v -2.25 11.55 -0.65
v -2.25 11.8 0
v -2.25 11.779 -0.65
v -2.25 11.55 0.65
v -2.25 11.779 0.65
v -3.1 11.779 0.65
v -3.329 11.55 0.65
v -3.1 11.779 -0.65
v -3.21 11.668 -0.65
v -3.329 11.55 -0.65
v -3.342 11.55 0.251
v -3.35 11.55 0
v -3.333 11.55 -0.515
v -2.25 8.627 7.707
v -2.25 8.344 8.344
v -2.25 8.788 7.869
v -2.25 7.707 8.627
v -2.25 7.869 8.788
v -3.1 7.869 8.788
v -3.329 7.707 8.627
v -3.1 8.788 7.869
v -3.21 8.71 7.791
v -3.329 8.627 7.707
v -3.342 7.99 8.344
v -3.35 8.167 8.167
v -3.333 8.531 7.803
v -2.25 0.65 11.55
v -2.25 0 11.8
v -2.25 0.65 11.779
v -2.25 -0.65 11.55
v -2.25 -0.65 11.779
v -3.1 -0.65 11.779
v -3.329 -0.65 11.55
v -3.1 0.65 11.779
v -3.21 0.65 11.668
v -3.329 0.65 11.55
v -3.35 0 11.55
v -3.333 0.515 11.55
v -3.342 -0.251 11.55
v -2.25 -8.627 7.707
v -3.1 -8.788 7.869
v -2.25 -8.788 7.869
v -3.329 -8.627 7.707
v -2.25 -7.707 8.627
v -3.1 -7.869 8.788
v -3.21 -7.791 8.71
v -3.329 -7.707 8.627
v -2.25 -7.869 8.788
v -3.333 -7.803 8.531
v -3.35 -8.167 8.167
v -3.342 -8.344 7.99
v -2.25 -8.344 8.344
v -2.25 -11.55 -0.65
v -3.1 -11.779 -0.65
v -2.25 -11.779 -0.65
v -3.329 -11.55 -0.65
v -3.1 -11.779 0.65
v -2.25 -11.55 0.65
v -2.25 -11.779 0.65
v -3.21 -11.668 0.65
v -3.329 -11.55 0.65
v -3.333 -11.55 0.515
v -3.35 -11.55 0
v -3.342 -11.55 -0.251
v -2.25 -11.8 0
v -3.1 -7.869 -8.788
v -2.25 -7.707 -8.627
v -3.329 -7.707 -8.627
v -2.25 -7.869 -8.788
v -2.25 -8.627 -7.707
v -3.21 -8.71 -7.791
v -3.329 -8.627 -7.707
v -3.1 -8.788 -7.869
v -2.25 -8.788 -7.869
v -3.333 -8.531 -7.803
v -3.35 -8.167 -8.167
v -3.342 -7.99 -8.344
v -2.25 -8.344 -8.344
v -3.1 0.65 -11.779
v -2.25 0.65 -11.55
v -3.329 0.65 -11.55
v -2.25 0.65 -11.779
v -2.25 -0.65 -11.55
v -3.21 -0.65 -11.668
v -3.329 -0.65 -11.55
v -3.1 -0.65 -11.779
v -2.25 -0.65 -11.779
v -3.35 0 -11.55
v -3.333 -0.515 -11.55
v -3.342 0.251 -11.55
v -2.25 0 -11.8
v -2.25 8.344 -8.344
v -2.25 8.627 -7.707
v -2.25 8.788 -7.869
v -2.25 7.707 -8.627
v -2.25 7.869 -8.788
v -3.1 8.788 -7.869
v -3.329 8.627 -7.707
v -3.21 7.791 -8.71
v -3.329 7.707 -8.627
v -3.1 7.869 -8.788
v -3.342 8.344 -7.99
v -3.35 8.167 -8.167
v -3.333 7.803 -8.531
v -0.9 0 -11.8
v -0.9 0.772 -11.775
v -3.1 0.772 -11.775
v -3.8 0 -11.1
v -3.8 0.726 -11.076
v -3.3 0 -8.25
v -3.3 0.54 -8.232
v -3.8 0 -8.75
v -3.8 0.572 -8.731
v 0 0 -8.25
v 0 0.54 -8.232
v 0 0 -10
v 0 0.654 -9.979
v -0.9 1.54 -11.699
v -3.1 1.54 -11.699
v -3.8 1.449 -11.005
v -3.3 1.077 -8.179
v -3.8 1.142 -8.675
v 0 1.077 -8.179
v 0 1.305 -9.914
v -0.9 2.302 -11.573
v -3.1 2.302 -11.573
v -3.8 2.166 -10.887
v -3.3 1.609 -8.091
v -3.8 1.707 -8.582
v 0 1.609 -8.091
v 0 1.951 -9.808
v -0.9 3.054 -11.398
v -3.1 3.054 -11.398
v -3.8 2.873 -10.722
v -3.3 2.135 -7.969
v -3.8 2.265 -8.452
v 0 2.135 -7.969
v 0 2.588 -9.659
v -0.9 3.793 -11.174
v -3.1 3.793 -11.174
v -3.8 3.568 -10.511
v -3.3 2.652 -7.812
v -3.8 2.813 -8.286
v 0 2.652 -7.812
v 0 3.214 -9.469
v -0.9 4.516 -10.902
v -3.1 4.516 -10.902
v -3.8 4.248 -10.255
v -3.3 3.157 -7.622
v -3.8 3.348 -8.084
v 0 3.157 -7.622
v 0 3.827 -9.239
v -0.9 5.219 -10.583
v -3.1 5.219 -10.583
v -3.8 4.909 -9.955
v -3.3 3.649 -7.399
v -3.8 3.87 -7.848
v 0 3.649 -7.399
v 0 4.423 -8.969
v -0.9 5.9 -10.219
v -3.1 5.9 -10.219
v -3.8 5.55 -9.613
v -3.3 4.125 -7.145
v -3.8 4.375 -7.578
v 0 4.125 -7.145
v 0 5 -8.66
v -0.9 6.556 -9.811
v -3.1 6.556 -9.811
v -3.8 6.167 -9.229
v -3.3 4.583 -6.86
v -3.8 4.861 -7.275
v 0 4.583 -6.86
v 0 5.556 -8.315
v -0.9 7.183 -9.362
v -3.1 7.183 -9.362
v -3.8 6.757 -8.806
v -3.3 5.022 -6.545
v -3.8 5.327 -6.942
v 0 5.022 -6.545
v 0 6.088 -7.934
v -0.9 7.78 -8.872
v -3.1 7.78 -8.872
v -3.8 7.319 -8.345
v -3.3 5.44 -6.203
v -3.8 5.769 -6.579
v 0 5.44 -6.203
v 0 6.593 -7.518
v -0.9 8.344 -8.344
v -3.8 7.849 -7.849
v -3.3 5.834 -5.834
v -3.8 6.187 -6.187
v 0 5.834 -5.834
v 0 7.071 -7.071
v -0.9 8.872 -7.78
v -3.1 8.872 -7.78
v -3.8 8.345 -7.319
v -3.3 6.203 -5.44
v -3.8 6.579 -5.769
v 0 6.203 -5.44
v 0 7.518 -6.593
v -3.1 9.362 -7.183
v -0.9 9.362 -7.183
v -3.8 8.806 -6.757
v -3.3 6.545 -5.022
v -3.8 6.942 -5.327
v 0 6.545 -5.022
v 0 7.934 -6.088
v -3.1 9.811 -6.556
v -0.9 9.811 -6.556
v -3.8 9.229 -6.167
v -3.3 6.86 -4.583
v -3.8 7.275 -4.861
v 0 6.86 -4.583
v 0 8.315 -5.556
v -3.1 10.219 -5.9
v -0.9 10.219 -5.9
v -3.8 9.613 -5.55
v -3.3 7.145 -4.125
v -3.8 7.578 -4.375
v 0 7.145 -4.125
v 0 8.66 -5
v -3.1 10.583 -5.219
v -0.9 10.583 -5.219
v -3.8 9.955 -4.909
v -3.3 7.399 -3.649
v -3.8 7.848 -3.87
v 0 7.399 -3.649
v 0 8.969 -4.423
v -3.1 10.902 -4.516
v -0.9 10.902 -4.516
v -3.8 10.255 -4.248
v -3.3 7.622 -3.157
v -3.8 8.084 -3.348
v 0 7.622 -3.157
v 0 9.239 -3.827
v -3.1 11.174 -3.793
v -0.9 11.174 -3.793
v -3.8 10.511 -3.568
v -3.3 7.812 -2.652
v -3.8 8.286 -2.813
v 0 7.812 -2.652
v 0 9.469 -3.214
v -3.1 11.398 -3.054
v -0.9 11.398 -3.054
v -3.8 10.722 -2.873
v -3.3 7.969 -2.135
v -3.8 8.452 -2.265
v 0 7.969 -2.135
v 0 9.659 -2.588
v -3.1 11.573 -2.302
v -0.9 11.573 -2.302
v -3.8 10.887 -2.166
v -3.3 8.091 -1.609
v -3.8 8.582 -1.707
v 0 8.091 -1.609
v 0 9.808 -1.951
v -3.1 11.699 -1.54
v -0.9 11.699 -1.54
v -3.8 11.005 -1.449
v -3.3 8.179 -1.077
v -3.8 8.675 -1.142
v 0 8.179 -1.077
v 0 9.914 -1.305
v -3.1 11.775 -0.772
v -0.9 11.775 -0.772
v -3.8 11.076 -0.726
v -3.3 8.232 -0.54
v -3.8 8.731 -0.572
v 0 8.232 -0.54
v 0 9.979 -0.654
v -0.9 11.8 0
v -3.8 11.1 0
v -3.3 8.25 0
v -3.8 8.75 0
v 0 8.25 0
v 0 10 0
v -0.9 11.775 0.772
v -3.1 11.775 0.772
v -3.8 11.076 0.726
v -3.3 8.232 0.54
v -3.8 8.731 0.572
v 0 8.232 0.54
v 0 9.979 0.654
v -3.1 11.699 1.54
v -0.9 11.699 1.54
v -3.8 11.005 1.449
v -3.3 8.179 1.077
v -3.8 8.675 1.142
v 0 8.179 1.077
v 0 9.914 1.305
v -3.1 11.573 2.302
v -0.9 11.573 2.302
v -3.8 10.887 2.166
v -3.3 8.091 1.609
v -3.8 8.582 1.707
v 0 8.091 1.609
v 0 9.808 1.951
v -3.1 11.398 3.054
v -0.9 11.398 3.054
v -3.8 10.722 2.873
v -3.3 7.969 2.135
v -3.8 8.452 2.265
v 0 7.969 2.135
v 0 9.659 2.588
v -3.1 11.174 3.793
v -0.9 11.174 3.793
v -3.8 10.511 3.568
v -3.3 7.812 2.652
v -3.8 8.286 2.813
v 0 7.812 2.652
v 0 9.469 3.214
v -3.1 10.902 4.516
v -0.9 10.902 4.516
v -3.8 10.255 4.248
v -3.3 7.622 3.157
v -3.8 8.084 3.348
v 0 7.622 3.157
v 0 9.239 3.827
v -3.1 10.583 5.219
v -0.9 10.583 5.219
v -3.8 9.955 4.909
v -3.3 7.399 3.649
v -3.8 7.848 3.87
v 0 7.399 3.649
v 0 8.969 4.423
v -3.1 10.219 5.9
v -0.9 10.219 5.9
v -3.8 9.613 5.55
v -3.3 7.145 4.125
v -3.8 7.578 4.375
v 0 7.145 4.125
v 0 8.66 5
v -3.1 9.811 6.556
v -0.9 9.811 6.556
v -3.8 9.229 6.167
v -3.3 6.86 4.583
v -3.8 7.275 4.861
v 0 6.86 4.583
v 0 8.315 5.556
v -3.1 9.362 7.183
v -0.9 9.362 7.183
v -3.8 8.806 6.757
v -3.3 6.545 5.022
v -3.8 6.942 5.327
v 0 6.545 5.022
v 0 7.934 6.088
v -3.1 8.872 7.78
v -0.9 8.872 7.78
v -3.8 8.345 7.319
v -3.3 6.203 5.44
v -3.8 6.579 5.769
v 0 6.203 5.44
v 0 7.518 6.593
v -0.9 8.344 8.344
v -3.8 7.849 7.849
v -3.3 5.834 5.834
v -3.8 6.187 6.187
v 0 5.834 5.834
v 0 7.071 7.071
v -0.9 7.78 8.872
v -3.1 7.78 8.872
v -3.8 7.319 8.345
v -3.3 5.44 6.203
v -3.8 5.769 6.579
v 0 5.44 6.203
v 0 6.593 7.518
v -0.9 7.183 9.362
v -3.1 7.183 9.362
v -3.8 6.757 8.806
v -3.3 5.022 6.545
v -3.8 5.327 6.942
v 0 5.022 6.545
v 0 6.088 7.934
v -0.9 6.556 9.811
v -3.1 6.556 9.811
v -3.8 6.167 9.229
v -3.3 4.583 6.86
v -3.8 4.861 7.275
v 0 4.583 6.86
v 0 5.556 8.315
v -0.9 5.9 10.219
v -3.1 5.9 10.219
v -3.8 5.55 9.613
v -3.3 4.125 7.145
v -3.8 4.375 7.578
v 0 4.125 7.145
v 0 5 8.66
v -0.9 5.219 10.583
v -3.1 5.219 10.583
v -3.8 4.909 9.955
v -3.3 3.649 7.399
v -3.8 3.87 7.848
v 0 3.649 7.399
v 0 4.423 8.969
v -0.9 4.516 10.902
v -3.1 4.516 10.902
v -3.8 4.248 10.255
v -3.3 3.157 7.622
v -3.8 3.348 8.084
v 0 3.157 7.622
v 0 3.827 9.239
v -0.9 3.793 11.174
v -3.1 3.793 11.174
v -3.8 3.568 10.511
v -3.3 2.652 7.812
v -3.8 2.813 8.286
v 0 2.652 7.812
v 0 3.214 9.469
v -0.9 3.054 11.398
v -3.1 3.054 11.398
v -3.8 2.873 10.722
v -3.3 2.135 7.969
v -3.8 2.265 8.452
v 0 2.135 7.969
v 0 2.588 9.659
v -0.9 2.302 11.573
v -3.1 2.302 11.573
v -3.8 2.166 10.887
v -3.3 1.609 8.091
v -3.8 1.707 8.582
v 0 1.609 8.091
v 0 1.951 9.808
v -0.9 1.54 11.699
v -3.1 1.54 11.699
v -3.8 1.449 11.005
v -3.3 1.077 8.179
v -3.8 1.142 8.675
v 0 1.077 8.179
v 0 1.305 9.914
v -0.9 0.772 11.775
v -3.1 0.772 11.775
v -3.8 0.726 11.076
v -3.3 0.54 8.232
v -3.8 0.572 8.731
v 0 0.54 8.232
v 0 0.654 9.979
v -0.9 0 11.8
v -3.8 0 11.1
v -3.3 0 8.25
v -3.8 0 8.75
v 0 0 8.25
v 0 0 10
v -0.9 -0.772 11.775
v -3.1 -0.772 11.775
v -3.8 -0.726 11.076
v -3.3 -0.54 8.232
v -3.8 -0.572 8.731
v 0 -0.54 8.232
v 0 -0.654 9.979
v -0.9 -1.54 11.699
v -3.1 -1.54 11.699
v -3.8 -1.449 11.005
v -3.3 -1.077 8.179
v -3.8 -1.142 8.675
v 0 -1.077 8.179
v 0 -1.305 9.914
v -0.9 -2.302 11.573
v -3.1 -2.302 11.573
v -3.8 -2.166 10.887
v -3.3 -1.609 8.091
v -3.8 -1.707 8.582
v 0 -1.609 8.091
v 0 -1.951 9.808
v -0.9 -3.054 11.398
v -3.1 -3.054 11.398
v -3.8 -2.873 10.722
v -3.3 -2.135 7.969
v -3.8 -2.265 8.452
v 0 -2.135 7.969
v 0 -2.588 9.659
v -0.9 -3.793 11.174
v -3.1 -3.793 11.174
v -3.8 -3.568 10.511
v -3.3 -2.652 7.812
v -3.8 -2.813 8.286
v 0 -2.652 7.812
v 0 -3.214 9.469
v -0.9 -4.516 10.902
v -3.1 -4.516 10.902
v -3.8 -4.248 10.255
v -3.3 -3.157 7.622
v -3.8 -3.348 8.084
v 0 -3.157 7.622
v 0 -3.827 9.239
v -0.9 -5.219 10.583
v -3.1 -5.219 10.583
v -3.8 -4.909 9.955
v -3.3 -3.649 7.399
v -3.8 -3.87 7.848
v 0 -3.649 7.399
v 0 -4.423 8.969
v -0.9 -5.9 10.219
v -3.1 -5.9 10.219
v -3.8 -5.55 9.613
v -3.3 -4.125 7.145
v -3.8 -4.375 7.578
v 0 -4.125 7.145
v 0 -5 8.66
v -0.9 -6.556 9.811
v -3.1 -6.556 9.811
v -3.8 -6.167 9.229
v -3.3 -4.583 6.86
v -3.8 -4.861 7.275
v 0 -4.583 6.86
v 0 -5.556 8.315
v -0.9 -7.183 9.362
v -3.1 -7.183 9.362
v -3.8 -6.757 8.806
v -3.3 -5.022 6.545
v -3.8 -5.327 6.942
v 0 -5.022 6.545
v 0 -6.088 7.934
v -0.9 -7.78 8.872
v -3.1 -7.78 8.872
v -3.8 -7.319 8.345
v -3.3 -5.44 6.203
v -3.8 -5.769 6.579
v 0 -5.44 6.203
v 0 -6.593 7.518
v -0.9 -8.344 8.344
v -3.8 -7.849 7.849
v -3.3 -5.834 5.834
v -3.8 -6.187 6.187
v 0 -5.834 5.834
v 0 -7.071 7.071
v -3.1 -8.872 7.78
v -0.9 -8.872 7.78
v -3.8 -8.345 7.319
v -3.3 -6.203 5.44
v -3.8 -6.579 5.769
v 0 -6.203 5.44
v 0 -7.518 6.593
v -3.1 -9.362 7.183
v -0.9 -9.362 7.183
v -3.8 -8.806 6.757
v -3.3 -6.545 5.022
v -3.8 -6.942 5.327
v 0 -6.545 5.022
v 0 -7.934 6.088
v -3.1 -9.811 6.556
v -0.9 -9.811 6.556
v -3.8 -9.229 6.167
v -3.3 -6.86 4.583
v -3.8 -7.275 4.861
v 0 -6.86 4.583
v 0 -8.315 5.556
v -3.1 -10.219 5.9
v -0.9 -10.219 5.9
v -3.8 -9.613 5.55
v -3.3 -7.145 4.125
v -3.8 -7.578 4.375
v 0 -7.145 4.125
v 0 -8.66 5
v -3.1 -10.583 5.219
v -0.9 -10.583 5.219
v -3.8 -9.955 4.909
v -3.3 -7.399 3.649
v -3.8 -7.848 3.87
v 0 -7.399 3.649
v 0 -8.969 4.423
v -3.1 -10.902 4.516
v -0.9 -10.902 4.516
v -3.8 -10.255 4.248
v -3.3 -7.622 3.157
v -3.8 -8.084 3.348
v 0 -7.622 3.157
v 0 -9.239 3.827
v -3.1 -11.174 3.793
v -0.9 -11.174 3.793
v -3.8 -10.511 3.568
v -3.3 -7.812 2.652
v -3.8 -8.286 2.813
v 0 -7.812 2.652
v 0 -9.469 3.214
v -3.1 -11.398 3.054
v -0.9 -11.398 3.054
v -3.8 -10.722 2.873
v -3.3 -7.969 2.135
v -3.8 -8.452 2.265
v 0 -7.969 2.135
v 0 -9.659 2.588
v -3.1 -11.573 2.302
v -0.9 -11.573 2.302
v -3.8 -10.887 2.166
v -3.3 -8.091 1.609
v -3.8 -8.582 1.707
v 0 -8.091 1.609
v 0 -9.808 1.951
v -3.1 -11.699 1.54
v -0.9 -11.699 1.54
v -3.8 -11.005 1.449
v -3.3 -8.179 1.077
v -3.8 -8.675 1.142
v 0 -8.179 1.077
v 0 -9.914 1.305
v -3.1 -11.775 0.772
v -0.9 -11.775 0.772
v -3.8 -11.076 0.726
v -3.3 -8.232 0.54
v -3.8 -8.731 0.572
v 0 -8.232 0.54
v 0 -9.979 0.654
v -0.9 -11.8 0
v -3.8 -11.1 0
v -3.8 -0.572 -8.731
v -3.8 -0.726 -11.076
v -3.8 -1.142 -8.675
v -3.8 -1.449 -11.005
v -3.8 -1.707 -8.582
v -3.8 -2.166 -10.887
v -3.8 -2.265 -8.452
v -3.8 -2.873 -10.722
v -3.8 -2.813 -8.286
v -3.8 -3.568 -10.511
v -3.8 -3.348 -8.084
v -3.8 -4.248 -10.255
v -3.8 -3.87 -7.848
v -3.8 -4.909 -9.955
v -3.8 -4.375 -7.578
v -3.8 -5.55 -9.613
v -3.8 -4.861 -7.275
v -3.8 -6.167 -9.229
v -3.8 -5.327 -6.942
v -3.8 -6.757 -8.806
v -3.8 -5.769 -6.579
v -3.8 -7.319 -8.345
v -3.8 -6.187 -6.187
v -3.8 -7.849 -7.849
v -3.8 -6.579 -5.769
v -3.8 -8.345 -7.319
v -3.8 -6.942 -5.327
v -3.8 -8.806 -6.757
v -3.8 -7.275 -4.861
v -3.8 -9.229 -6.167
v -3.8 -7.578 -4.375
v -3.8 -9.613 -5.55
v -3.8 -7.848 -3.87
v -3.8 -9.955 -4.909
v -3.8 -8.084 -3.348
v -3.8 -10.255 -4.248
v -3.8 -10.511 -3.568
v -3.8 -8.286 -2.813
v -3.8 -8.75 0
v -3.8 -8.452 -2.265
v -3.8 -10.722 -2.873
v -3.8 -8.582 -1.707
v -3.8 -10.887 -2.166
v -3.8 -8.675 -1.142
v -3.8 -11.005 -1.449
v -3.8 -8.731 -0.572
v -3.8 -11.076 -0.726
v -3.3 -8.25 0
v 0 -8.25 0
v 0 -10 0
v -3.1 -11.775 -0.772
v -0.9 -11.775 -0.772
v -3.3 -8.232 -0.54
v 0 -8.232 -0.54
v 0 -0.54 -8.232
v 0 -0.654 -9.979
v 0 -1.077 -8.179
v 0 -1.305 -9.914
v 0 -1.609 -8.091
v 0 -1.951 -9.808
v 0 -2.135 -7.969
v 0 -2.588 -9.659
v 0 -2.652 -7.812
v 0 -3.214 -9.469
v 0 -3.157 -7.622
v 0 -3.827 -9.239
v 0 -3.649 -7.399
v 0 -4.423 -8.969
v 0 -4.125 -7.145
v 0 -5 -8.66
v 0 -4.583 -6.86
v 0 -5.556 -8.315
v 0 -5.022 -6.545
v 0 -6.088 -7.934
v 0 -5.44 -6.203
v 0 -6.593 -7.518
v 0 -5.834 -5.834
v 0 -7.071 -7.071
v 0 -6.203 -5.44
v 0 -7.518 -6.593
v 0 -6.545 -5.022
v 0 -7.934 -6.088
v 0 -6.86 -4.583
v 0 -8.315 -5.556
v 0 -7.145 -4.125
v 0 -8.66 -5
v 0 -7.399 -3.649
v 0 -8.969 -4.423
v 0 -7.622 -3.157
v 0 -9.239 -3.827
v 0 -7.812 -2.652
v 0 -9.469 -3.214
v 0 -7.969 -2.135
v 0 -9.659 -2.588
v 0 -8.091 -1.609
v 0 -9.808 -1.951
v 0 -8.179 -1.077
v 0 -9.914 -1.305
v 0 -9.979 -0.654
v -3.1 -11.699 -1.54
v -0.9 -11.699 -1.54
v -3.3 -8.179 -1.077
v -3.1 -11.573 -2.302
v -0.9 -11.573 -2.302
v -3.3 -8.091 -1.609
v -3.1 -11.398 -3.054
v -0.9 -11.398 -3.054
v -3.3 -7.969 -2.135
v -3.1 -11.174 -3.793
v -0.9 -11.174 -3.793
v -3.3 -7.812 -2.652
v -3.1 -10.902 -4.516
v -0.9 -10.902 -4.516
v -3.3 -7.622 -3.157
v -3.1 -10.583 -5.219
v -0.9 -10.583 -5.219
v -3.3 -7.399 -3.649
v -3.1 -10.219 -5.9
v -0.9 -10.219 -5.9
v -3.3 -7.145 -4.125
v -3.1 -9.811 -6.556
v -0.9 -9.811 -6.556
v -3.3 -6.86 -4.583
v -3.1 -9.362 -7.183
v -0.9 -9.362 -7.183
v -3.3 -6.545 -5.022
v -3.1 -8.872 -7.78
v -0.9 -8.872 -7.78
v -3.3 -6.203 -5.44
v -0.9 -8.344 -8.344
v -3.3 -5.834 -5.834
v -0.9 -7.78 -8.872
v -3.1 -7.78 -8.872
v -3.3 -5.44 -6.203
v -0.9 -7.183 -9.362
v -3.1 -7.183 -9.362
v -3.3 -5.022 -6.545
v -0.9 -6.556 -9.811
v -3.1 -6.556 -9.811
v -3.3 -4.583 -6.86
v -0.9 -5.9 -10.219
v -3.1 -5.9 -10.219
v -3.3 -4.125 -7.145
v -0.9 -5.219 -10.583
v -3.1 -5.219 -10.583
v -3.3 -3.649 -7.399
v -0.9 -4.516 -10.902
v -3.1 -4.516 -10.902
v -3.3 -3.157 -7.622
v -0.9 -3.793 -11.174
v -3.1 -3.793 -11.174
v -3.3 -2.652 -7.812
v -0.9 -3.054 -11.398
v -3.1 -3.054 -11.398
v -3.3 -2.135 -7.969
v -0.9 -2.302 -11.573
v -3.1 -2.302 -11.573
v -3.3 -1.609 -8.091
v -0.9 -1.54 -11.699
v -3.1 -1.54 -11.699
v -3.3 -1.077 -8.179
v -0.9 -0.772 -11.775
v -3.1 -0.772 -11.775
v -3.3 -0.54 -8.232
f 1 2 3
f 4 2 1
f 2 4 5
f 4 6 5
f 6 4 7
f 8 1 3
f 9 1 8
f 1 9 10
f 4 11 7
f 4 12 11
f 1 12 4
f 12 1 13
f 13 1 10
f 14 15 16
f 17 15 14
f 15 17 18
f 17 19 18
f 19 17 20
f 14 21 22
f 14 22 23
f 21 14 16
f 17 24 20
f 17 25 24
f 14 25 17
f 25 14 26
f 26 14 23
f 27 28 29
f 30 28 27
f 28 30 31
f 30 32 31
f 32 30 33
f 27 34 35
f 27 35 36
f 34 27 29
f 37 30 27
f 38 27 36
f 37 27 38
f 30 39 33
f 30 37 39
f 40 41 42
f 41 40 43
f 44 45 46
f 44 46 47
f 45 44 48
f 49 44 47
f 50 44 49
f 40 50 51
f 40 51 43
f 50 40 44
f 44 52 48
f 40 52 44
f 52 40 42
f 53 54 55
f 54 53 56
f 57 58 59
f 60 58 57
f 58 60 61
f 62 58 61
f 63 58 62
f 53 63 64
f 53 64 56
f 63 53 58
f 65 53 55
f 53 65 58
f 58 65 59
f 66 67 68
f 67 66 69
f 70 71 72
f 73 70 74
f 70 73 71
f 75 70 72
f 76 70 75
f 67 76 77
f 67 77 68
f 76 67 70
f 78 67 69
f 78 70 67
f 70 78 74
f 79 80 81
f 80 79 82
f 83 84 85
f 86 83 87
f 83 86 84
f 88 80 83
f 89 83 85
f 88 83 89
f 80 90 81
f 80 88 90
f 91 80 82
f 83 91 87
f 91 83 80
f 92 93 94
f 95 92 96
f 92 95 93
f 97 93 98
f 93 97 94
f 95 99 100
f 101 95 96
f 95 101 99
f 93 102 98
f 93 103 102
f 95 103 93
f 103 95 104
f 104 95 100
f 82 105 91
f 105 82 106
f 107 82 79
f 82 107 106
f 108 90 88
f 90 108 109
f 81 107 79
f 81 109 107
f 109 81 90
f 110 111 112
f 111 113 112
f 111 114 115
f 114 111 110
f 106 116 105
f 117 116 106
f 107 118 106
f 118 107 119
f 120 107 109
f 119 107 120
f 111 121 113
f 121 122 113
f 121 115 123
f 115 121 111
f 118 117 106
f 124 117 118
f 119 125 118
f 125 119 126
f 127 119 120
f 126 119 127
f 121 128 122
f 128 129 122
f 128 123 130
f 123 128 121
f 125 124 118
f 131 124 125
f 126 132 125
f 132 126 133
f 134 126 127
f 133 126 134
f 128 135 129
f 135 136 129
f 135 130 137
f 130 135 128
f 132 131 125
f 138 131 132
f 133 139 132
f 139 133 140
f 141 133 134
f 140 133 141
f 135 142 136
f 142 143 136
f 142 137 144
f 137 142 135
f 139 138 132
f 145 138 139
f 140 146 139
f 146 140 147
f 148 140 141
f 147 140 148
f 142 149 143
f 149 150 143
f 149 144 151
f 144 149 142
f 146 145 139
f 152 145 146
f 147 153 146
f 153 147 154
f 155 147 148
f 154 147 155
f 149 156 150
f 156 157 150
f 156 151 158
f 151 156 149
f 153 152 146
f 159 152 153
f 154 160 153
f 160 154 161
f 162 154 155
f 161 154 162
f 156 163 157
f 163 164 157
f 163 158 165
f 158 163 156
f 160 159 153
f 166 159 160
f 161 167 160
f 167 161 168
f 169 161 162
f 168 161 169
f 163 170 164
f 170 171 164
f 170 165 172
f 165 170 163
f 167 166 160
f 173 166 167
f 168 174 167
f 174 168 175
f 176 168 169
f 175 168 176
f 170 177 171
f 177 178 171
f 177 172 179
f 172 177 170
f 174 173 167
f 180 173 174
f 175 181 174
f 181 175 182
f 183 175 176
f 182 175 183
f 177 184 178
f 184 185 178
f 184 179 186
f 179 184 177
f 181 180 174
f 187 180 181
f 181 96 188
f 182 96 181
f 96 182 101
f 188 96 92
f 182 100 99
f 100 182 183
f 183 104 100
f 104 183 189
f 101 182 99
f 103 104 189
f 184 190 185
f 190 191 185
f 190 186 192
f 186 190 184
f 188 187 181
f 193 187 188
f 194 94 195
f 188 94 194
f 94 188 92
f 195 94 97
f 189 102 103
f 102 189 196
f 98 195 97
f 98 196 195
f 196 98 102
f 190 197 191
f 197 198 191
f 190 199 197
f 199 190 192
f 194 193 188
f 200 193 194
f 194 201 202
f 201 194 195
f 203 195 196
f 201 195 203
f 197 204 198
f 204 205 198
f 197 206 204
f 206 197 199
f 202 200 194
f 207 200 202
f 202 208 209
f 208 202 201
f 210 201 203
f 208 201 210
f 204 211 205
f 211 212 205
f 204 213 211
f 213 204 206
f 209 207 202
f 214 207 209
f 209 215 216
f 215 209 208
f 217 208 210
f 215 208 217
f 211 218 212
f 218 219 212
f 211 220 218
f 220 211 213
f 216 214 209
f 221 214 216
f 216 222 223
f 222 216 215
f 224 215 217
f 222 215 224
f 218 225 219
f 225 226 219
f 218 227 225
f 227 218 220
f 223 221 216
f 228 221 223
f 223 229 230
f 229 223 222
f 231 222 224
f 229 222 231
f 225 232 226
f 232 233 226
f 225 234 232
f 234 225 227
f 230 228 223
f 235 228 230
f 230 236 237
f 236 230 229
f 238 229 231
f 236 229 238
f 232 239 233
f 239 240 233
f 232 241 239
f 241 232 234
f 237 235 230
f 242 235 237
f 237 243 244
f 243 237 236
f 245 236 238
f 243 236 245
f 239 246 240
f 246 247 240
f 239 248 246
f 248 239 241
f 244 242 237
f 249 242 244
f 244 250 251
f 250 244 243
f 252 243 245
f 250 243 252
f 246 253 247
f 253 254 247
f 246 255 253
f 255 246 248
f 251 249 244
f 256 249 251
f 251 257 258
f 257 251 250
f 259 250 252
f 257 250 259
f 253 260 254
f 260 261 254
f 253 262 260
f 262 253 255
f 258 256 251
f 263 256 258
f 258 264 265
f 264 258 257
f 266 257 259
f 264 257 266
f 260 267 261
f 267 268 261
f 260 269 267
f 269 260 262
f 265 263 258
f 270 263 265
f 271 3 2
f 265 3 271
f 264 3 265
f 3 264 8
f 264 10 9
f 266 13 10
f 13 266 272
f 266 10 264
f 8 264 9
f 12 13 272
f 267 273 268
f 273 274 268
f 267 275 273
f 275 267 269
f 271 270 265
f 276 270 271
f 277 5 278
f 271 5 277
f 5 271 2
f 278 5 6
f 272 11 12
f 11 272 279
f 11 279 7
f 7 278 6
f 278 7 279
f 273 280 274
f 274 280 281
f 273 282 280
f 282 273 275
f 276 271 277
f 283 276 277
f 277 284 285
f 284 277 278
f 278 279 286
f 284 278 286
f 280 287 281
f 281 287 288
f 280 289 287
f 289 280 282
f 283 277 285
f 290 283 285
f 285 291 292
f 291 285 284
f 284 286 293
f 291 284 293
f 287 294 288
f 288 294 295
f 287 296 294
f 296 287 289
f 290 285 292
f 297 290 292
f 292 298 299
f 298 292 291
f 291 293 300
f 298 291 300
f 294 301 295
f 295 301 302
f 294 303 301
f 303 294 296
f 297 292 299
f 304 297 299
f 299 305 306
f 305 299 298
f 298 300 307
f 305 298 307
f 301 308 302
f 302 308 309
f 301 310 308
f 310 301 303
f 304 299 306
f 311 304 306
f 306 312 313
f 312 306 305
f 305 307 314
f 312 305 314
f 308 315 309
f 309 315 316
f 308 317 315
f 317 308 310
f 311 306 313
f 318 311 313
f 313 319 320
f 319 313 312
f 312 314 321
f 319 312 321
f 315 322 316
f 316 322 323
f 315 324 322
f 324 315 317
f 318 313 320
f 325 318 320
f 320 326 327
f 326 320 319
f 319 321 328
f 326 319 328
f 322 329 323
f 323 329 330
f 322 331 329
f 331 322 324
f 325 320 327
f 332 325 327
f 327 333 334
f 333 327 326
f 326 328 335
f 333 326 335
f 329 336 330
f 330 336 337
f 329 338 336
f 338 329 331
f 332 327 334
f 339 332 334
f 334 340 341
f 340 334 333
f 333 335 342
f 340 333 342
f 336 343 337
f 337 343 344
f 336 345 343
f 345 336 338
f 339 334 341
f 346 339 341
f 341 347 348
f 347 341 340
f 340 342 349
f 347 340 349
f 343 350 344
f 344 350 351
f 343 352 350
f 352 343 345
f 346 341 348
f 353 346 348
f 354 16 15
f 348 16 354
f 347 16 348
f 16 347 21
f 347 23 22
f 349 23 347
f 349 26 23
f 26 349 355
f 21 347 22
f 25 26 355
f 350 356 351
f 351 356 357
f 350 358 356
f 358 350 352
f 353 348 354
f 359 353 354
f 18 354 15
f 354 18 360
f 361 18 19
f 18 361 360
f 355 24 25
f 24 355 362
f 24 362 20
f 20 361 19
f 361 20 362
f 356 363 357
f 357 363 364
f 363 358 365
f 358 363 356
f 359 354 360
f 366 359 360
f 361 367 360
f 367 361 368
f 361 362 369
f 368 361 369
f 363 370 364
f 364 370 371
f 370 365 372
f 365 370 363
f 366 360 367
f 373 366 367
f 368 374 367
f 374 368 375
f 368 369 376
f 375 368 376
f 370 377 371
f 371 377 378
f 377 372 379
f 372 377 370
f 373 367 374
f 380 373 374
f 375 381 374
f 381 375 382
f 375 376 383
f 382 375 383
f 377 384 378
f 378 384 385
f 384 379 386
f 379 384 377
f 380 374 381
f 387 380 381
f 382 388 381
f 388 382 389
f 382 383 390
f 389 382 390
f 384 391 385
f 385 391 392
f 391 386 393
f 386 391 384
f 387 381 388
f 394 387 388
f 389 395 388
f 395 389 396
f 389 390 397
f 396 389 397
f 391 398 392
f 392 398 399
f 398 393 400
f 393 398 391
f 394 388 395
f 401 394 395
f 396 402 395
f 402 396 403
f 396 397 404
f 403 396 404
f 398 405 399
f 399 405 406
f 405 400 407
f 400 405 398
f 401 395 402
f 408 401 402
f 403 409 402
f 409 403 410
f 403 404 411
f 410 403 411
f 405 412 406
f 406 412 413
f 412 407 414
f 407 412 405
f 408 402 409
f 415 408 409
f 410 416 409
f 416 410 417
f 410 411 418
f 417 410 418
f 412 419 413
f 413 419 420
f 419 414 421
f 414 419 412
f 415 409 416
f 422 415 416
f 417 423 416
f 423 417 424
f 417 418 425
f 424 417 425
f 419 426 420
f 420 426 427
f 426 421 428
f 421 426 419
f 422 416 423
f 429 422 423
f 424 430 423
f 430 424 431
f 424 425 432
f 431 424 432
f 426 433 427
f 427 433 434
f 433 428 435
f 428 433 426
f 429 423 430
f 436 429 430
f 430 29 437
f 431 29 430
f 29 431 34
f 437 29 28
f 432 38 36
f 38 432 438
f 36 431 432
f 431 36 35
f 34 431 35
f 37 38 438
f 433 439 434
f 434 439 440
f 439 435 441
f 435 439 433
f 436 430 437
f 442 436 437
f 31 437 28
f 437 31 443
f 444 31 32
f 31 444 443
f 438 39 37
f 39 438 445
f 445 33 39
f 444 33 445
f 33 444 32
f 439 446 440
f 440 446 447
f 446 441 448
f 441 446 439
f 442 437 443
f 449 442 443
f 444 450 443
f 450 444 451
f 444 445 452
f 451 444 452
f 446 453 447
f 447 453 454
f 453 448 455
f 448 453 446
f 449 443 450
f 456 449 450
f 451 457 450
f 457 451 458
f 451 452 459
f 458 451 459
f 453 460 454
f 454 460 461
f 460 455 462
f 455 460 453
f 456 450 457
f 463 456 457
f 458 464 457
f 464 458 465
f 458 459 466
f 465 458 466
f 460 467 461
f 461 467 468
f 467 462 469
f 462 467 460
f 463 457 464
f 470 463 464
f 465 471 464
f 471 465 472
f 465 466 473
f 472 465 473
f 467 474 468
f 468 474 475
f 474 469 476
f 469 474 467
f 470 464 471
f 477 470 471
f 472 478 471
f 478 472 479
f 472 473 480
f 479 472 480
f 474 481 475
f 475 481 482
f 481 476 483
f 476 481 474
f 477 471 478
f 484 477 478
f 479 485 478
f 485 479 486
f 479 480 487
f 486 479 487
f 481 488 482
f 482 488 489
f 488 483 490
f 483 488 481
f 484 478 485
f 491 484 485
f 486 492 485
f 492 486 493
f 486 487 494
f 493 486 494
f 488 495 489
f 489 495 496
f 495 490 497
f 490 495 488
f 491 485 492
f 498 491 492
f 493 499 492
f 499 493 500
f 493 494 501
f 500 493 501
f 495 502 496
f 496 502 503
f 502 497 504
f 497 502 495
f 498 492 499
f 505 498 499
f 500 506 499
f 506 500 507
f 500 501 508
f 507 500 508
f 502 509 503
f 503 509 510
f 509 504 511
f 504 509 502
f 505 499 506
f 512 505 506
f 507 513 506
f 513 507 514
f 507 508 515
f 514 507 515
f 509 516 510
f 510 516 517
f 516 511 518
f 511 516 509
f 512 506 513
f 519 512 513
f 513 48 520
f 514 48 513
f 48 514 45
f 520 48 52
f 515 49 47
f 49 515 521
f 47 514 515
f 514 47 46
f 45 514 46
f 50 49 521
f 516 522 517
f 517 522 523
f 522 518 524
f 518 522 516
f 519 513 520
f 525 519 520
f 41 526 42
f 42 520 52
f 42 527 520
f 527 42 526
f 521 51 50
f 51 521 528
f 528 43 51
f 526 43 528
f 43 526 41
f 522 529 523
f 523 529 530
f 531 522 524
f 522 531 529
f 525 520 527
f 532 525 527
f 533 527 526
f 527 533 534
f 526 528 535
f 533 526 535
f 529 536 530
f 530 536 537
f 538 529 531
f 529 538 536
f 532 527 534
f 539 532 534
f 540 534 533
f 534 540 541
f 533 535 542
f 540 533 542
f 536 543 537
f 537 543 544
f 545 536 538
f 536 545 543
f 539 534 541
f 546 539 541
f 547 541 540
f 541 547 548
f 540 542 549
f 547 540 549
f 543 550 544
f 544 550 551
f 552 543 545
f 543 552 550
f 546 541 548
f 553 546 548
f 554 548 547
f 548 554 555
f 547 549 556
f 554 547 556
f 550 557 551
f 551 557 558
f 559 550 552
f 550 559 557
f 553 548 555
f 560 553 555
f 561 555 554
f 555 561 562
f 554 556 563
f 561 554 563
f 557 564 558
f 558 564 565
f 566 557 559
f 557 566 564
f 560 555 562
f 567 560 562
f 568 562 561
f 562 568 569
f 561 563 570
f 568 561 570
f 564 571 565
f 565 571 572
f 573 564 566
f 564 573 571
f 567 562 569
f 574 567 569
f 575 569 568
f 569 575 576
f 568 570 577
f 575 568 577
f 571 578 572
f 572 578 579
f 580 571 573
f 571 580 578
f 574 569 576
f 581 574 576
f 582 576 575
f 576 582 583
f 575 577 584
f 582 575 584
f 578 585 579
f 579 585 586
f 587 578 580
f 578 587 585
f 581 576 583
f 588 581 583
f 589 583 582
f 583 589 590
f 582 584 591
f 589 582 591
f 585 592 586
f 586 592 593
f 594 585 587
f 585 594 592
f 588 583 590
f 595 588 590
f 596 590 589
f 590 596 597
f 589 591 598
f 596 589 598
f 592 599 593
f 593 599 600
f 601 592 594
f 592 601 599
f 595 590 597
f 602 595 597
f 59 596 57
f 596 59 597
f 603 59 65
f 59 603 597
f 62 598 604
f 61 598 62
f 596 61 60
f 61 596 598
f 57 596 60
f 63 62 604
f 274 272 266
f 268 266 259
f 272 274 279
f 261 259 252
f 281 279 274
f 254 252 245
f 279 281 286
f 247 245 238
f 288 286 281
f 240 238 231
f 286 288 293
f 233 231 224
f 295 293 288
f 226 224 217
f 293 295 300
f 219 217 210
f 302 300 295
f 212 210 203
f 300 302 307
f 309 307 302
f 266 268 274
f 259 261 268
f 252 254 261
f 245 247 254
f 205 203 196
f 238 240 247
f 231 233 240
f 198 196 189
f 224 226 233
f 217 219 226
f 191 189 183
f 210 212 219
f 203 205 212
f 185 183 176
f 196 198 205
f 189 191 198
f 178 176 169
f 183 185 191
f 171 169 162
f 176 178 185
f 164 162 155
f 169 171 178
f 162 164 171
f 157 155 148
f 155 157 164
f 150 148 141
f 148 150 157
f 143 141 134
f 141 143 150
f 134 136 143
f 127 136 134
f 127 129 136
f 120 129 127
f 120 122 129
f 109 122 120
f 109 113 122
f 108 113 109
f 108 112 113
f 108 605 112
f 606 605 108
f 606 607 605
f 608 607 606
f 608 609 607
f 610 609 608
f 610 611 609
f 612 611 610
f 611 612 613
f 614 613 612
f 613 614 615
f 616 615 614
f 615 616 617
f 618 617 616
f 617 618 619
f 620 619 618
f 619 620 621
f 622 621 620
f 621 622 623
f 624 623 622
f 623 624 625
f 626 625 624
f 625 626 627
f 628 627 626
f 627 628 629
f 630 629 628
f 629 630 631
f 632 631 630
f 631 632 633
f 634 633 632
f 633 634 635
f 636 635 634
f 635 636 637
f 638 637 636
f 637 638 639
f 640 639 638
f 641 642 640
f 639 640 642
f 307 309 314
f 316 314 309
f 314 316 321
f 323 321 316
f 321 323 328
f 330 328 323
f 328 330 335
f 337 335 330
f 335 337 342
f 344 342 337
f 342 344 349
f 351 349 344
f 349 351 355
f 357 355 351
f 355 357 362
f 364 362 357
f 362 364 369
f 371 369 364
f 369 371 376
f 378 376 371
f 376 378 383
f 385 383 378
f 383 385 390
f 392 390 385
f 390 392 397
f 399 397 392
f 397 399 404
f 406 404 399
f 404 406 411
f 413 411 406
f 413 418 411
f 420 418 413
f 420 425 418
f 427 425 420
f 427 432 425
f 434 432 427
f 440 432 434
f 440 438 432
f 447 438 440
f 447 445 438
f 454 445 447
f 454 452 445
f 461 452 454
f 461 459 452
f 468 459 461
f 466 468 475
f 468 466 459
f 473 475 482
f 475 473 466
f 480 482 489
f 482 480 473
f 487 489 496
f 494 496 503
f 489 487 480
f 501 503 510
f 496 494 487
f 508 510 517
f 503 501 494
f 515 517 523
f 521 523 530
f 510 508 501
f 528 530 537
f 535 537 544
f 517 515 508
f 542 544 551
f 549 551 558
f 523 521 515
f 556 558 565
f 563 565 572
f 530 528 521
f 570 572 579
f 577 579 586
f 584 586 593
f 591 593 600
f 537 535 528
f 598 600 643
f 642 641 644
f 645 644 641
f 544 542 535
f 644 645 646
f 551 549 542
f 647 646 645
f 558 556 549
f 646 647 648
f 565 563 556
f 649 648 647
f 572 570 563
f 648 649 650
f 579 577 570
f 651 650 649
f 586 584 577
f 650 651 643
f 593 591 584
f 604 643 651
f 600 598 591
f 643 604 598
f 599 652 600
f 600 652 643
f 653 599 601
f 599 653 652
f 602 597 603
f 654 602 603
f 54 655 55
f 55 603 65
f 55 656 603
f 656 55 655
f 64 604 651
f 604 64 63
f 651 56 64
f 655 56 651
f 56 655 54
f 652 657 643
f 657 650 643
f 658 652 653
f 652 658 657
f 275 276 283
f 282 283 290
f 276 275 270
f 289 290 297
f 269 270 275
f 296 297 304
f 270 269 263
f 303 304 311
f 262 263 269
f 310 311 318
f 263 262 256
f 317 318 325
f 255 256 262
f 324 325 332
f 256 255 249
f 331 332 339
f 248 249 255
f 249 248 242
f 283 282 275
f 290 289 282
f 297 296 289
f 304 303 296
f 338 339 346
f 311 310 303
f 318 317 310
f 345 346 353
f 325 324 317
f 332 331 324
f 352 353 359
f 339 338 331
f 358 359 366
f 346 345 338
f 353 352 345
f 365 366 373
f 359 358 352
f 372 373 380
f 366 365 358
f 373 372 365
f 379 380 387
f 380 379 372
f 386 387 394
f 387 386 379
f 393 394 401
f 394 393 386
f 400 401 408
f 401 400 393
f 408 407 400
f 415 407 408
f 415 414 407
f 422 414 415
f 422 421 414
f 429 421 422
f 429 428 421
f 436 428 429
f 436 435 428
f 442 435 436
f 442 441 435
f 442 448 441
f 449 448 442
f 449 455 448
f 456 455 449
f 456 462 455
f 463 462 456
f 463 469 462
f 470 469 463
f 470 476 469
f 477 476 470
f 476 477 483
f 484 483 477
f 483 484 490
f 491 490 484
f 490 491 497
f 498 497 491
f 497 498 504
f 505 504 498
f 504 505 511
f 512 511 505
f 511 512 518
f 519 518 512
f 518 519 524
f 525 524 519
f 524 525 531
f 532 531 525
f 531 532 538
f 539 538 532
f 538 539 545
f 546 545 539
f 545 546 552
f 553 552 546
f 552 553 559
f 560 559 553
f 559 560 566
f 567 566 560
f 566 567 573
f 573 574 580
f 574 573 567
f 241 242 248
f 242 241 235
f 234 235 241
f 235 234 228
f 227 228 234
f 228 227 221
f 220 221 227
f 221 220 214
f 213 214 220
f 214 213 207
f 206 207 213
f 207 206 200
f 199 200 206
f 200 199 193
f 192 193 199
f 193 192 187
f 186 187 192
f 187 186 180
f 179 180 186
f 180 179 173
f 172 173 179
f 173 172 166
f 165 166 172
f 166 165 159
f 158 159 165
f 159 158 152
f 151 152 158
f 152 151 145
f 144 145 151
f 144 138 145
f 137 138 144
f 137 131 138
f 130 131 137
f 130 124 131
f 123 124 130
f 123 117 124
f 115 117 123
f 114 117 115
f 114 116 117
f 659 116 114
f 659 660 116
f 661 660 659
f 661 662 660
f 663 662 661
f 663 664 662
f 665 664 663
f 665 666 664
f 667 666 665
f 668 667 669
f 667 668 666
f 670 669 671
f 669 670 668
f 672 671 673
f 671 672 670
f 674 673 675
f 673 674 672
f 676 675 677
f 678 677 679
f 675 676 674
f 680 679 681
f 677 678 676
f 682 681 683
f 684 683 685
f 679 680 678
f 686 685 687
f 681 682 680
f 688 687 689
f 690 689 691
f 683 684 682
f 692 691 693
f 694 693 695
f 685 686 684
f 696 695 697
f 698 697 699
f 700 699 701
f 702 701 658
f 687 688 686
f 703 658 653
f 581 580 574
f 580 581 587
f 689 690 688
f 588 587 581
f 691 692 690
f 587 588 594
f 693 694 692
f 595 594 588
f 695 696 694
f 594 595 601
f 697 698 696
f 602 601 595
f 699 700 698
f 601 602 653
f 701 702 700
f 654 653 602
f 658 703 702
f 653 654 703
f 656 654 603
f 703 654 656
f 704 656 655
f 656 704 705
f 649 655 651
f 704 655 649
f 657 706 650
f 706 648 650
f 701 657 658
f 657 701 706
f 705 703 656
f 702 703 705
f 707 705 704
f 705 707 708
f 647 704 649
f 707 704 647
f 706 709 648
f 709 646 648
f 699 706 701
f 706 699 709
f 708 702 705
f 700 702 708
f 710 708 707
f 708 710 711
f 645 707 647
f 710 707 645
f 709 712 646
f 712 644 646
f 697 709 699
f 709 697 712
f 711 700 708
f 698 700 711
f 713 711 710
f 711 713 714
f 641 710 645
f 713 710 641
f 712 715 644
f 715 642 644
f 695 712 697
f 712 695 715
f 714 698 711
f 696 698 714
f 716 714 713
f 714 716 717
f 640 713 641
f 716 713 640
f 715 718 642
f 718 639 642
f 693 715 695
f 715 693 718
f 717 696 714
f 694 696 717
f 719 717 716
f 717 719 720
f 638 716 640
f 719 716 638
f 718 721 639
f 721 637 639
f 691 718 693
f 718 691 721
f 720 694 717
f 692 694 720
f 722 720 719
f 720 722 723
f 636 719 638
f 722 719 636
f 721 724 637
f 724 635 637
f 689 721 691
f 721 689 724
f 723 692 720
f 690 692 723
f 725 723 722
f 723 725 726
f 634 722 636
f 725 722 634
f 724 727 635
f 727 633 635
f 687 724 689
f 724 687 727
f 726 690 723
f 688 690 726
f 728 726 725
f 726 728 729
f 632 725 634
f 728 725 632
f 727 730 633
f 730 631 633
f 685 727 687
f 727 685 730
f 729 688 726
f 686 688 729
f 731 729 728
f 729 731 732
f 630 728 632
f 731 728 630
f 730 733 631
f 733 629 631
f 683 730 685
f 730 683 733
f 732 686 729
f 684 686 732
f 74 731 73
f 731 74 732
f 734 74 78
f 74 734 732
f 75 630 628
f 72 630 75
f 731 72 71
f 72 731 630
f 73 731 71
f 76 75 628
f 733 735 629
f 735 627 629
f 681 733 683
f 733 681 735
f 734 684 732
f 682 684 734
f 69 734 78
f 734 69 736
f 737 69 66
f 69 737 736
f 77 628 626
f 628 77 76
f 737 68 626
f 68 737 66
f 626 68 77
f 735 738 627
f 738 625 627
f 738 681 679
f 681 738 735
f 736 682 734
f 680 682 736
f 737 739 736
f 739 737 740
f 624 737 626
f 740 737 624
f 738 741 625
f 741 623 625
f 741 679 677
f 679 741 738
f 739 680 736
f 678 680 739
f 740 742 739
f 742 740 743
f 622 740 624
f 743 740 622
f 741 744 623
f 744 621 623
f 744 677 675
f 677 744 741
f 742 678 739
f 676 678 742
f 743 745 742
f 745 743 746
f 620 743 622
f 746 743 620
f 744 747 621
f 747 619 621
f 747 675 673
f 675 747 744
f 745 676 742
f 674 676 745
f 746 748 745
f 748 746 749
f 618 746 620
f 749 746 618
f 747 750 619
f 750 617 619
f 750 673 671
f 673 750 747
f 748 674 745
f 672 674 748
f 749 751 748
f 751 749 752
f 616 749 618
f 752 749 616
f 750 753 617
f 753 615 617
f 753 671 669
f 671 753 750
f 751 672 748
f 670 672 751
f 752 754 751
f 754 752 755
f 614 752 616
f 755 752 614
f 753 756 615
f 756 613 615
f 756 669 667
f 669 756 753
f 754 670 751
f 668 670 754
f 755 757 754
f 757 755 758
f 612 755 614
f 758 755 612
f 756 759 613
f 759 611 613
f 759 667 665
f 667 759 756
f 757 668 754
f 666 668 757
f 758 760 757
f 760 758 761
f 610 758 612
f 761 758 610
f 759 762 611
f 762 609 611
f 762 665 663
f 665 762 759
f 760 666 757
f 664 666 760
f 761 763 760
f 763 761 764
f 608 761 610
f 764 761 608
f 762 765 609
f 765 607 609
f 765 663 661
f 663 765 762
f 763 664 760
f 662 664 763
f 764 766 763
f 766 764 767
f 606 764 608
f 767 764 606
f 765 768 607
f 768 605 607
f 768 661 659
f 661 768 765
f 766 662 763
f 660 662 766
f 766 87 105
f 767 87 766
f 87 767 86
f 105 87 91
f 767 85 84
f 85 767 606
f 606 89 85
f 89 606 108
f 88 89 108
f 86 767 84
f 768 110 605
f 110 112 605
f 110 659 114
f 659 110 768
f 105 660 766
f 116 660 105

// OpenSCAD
// Decorative exterior bezel for the NexGen-derived power button.
//
// Visualization-only geometry: the supplied logo cap remains a separate mesh,
// while this part gives it a deliberate exterior surround. Local X is the
// front/rear axis, with X=0 at the panel side and negative X facing outward.

$fn = 96;

outer_d = 23.6;
inner_d = 16.5;
depth = 3.8;
front_lip = 0.9;

module beveled_ring() {
    // Build around Z and rotate so the exported button axis is X.
    rotate([0, -90, 0])
        rotate_extrude(convexity = 10)
            polygon([
                [inner_d / 2, 0],
                [outer_d / 2 - 1.8, 0],
                [outer_d / 2, front_lip],
                [outer_d / 2, depth - 0.7],
                [outer_d / 2 - 0.7, depth],
                [inner_d / 2 + 0.5, depth],
                [inner_d / 2, depth - 0.5]
            ]);
}

module decorative_bezel() {
    difference() {
        beveled_ring();

        // Eight shallow grip cuts catch highlights without competing with the
        // logo. They also make the ring read as a separate machined component.
        for (angle = [0 : 45 : 315])
            rotate([angle, 0, 0])
                translate([-depth + 0.35, outer_d / 2 - 0.25, -0.65])
                    cube([1.2, 1.0, 1.3]);
    }
}

decorative_bezel();

echo("decorative_button_bezel_mm", [depth, outer_d, inner_d]);
echo("axis", "X; X=0 panel side, negative X outward");
